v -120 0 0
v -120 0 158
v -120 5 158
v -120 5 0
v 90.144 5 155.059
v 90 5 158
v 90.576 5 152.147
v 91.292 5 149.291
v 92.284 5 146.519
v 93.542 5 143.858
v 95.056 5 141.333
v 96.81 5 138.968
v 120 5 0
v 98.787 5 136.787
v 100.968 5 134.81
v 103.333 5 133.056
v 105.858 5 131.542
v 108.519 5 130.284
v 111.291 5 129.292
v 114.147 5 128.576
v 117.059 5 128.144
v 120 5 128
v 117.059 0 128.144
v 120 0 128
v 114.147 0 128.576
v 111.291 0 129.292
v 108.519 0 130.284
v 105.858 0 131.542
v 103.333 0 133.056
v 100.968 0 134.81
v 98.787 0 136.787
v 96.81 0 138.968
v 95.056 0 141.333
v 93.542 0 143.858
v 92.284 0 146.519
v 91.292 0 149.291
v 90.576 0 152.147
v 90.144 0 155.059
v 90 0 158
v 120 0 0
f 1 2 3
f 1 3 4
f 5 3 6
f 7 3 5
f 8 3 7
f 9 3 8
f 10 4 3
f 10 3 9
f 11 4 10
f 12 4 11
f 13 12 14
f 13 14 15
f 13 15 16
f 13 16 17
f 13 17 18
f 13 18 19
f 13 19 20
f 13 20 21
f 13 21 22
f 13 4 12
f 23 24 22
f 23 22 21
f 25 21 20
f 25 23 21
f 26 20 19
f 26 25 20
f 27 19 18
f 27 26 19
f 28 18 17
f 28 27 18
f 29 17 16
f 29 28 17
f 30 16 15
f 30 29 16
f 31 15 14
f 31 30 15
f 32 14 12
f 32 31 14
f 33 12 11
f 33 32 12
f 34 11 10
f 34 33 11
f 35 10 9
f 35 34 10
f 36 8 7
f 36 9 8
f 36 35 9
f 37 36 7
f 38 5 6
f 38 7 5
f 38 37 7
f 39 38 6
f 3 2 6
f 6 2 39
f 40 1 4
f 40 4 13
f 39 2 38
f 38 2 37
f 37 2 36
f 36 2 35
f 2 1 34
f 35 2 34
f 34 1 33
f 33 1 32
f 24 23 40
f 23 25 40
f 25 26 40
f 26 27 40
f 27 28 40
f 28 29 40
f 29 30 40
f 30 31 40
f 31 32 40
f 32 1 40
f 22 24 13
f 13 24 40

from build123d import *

# Parameters (mm, degrees)
SKETCH1_W           = 240
SKETCH1_H           = 158
BOSS_EXTRUDE1_DEPTH = 5
CUT_EXTRUDE1_DEPTH  = 6


with BuildPart() as part:
    # Sketch1 → Boss-Extrude1 (new body)
    with BuildSketch(Plane(origin=(0, 0, 0), x_dir=(1, 0, 0), z_dir=(0, 1, 0))):
        with Locations((0, -79)):
            Rectangle(SKETCH1_W, SKETCH1_H)
    extrude(amount=BOSS_EXTRUDE1_DEPTH)

    # Sketch5 → Cut-Extrude1 (cut, through all)
    with BuildSketch(Plane.XZ):
        with BuildLine():
            Line((120, 158), (120, 128))
            ThreePointArc((120, 128), (98.786796564, 136.786796564), (90, 158))
            Line((90, 158), (120, 158))
        make_face()
    extrude(amount=-CUT_EXTRUDE1_DEPTH, mode=Mode.SUBTRACT)


solid = part.part
